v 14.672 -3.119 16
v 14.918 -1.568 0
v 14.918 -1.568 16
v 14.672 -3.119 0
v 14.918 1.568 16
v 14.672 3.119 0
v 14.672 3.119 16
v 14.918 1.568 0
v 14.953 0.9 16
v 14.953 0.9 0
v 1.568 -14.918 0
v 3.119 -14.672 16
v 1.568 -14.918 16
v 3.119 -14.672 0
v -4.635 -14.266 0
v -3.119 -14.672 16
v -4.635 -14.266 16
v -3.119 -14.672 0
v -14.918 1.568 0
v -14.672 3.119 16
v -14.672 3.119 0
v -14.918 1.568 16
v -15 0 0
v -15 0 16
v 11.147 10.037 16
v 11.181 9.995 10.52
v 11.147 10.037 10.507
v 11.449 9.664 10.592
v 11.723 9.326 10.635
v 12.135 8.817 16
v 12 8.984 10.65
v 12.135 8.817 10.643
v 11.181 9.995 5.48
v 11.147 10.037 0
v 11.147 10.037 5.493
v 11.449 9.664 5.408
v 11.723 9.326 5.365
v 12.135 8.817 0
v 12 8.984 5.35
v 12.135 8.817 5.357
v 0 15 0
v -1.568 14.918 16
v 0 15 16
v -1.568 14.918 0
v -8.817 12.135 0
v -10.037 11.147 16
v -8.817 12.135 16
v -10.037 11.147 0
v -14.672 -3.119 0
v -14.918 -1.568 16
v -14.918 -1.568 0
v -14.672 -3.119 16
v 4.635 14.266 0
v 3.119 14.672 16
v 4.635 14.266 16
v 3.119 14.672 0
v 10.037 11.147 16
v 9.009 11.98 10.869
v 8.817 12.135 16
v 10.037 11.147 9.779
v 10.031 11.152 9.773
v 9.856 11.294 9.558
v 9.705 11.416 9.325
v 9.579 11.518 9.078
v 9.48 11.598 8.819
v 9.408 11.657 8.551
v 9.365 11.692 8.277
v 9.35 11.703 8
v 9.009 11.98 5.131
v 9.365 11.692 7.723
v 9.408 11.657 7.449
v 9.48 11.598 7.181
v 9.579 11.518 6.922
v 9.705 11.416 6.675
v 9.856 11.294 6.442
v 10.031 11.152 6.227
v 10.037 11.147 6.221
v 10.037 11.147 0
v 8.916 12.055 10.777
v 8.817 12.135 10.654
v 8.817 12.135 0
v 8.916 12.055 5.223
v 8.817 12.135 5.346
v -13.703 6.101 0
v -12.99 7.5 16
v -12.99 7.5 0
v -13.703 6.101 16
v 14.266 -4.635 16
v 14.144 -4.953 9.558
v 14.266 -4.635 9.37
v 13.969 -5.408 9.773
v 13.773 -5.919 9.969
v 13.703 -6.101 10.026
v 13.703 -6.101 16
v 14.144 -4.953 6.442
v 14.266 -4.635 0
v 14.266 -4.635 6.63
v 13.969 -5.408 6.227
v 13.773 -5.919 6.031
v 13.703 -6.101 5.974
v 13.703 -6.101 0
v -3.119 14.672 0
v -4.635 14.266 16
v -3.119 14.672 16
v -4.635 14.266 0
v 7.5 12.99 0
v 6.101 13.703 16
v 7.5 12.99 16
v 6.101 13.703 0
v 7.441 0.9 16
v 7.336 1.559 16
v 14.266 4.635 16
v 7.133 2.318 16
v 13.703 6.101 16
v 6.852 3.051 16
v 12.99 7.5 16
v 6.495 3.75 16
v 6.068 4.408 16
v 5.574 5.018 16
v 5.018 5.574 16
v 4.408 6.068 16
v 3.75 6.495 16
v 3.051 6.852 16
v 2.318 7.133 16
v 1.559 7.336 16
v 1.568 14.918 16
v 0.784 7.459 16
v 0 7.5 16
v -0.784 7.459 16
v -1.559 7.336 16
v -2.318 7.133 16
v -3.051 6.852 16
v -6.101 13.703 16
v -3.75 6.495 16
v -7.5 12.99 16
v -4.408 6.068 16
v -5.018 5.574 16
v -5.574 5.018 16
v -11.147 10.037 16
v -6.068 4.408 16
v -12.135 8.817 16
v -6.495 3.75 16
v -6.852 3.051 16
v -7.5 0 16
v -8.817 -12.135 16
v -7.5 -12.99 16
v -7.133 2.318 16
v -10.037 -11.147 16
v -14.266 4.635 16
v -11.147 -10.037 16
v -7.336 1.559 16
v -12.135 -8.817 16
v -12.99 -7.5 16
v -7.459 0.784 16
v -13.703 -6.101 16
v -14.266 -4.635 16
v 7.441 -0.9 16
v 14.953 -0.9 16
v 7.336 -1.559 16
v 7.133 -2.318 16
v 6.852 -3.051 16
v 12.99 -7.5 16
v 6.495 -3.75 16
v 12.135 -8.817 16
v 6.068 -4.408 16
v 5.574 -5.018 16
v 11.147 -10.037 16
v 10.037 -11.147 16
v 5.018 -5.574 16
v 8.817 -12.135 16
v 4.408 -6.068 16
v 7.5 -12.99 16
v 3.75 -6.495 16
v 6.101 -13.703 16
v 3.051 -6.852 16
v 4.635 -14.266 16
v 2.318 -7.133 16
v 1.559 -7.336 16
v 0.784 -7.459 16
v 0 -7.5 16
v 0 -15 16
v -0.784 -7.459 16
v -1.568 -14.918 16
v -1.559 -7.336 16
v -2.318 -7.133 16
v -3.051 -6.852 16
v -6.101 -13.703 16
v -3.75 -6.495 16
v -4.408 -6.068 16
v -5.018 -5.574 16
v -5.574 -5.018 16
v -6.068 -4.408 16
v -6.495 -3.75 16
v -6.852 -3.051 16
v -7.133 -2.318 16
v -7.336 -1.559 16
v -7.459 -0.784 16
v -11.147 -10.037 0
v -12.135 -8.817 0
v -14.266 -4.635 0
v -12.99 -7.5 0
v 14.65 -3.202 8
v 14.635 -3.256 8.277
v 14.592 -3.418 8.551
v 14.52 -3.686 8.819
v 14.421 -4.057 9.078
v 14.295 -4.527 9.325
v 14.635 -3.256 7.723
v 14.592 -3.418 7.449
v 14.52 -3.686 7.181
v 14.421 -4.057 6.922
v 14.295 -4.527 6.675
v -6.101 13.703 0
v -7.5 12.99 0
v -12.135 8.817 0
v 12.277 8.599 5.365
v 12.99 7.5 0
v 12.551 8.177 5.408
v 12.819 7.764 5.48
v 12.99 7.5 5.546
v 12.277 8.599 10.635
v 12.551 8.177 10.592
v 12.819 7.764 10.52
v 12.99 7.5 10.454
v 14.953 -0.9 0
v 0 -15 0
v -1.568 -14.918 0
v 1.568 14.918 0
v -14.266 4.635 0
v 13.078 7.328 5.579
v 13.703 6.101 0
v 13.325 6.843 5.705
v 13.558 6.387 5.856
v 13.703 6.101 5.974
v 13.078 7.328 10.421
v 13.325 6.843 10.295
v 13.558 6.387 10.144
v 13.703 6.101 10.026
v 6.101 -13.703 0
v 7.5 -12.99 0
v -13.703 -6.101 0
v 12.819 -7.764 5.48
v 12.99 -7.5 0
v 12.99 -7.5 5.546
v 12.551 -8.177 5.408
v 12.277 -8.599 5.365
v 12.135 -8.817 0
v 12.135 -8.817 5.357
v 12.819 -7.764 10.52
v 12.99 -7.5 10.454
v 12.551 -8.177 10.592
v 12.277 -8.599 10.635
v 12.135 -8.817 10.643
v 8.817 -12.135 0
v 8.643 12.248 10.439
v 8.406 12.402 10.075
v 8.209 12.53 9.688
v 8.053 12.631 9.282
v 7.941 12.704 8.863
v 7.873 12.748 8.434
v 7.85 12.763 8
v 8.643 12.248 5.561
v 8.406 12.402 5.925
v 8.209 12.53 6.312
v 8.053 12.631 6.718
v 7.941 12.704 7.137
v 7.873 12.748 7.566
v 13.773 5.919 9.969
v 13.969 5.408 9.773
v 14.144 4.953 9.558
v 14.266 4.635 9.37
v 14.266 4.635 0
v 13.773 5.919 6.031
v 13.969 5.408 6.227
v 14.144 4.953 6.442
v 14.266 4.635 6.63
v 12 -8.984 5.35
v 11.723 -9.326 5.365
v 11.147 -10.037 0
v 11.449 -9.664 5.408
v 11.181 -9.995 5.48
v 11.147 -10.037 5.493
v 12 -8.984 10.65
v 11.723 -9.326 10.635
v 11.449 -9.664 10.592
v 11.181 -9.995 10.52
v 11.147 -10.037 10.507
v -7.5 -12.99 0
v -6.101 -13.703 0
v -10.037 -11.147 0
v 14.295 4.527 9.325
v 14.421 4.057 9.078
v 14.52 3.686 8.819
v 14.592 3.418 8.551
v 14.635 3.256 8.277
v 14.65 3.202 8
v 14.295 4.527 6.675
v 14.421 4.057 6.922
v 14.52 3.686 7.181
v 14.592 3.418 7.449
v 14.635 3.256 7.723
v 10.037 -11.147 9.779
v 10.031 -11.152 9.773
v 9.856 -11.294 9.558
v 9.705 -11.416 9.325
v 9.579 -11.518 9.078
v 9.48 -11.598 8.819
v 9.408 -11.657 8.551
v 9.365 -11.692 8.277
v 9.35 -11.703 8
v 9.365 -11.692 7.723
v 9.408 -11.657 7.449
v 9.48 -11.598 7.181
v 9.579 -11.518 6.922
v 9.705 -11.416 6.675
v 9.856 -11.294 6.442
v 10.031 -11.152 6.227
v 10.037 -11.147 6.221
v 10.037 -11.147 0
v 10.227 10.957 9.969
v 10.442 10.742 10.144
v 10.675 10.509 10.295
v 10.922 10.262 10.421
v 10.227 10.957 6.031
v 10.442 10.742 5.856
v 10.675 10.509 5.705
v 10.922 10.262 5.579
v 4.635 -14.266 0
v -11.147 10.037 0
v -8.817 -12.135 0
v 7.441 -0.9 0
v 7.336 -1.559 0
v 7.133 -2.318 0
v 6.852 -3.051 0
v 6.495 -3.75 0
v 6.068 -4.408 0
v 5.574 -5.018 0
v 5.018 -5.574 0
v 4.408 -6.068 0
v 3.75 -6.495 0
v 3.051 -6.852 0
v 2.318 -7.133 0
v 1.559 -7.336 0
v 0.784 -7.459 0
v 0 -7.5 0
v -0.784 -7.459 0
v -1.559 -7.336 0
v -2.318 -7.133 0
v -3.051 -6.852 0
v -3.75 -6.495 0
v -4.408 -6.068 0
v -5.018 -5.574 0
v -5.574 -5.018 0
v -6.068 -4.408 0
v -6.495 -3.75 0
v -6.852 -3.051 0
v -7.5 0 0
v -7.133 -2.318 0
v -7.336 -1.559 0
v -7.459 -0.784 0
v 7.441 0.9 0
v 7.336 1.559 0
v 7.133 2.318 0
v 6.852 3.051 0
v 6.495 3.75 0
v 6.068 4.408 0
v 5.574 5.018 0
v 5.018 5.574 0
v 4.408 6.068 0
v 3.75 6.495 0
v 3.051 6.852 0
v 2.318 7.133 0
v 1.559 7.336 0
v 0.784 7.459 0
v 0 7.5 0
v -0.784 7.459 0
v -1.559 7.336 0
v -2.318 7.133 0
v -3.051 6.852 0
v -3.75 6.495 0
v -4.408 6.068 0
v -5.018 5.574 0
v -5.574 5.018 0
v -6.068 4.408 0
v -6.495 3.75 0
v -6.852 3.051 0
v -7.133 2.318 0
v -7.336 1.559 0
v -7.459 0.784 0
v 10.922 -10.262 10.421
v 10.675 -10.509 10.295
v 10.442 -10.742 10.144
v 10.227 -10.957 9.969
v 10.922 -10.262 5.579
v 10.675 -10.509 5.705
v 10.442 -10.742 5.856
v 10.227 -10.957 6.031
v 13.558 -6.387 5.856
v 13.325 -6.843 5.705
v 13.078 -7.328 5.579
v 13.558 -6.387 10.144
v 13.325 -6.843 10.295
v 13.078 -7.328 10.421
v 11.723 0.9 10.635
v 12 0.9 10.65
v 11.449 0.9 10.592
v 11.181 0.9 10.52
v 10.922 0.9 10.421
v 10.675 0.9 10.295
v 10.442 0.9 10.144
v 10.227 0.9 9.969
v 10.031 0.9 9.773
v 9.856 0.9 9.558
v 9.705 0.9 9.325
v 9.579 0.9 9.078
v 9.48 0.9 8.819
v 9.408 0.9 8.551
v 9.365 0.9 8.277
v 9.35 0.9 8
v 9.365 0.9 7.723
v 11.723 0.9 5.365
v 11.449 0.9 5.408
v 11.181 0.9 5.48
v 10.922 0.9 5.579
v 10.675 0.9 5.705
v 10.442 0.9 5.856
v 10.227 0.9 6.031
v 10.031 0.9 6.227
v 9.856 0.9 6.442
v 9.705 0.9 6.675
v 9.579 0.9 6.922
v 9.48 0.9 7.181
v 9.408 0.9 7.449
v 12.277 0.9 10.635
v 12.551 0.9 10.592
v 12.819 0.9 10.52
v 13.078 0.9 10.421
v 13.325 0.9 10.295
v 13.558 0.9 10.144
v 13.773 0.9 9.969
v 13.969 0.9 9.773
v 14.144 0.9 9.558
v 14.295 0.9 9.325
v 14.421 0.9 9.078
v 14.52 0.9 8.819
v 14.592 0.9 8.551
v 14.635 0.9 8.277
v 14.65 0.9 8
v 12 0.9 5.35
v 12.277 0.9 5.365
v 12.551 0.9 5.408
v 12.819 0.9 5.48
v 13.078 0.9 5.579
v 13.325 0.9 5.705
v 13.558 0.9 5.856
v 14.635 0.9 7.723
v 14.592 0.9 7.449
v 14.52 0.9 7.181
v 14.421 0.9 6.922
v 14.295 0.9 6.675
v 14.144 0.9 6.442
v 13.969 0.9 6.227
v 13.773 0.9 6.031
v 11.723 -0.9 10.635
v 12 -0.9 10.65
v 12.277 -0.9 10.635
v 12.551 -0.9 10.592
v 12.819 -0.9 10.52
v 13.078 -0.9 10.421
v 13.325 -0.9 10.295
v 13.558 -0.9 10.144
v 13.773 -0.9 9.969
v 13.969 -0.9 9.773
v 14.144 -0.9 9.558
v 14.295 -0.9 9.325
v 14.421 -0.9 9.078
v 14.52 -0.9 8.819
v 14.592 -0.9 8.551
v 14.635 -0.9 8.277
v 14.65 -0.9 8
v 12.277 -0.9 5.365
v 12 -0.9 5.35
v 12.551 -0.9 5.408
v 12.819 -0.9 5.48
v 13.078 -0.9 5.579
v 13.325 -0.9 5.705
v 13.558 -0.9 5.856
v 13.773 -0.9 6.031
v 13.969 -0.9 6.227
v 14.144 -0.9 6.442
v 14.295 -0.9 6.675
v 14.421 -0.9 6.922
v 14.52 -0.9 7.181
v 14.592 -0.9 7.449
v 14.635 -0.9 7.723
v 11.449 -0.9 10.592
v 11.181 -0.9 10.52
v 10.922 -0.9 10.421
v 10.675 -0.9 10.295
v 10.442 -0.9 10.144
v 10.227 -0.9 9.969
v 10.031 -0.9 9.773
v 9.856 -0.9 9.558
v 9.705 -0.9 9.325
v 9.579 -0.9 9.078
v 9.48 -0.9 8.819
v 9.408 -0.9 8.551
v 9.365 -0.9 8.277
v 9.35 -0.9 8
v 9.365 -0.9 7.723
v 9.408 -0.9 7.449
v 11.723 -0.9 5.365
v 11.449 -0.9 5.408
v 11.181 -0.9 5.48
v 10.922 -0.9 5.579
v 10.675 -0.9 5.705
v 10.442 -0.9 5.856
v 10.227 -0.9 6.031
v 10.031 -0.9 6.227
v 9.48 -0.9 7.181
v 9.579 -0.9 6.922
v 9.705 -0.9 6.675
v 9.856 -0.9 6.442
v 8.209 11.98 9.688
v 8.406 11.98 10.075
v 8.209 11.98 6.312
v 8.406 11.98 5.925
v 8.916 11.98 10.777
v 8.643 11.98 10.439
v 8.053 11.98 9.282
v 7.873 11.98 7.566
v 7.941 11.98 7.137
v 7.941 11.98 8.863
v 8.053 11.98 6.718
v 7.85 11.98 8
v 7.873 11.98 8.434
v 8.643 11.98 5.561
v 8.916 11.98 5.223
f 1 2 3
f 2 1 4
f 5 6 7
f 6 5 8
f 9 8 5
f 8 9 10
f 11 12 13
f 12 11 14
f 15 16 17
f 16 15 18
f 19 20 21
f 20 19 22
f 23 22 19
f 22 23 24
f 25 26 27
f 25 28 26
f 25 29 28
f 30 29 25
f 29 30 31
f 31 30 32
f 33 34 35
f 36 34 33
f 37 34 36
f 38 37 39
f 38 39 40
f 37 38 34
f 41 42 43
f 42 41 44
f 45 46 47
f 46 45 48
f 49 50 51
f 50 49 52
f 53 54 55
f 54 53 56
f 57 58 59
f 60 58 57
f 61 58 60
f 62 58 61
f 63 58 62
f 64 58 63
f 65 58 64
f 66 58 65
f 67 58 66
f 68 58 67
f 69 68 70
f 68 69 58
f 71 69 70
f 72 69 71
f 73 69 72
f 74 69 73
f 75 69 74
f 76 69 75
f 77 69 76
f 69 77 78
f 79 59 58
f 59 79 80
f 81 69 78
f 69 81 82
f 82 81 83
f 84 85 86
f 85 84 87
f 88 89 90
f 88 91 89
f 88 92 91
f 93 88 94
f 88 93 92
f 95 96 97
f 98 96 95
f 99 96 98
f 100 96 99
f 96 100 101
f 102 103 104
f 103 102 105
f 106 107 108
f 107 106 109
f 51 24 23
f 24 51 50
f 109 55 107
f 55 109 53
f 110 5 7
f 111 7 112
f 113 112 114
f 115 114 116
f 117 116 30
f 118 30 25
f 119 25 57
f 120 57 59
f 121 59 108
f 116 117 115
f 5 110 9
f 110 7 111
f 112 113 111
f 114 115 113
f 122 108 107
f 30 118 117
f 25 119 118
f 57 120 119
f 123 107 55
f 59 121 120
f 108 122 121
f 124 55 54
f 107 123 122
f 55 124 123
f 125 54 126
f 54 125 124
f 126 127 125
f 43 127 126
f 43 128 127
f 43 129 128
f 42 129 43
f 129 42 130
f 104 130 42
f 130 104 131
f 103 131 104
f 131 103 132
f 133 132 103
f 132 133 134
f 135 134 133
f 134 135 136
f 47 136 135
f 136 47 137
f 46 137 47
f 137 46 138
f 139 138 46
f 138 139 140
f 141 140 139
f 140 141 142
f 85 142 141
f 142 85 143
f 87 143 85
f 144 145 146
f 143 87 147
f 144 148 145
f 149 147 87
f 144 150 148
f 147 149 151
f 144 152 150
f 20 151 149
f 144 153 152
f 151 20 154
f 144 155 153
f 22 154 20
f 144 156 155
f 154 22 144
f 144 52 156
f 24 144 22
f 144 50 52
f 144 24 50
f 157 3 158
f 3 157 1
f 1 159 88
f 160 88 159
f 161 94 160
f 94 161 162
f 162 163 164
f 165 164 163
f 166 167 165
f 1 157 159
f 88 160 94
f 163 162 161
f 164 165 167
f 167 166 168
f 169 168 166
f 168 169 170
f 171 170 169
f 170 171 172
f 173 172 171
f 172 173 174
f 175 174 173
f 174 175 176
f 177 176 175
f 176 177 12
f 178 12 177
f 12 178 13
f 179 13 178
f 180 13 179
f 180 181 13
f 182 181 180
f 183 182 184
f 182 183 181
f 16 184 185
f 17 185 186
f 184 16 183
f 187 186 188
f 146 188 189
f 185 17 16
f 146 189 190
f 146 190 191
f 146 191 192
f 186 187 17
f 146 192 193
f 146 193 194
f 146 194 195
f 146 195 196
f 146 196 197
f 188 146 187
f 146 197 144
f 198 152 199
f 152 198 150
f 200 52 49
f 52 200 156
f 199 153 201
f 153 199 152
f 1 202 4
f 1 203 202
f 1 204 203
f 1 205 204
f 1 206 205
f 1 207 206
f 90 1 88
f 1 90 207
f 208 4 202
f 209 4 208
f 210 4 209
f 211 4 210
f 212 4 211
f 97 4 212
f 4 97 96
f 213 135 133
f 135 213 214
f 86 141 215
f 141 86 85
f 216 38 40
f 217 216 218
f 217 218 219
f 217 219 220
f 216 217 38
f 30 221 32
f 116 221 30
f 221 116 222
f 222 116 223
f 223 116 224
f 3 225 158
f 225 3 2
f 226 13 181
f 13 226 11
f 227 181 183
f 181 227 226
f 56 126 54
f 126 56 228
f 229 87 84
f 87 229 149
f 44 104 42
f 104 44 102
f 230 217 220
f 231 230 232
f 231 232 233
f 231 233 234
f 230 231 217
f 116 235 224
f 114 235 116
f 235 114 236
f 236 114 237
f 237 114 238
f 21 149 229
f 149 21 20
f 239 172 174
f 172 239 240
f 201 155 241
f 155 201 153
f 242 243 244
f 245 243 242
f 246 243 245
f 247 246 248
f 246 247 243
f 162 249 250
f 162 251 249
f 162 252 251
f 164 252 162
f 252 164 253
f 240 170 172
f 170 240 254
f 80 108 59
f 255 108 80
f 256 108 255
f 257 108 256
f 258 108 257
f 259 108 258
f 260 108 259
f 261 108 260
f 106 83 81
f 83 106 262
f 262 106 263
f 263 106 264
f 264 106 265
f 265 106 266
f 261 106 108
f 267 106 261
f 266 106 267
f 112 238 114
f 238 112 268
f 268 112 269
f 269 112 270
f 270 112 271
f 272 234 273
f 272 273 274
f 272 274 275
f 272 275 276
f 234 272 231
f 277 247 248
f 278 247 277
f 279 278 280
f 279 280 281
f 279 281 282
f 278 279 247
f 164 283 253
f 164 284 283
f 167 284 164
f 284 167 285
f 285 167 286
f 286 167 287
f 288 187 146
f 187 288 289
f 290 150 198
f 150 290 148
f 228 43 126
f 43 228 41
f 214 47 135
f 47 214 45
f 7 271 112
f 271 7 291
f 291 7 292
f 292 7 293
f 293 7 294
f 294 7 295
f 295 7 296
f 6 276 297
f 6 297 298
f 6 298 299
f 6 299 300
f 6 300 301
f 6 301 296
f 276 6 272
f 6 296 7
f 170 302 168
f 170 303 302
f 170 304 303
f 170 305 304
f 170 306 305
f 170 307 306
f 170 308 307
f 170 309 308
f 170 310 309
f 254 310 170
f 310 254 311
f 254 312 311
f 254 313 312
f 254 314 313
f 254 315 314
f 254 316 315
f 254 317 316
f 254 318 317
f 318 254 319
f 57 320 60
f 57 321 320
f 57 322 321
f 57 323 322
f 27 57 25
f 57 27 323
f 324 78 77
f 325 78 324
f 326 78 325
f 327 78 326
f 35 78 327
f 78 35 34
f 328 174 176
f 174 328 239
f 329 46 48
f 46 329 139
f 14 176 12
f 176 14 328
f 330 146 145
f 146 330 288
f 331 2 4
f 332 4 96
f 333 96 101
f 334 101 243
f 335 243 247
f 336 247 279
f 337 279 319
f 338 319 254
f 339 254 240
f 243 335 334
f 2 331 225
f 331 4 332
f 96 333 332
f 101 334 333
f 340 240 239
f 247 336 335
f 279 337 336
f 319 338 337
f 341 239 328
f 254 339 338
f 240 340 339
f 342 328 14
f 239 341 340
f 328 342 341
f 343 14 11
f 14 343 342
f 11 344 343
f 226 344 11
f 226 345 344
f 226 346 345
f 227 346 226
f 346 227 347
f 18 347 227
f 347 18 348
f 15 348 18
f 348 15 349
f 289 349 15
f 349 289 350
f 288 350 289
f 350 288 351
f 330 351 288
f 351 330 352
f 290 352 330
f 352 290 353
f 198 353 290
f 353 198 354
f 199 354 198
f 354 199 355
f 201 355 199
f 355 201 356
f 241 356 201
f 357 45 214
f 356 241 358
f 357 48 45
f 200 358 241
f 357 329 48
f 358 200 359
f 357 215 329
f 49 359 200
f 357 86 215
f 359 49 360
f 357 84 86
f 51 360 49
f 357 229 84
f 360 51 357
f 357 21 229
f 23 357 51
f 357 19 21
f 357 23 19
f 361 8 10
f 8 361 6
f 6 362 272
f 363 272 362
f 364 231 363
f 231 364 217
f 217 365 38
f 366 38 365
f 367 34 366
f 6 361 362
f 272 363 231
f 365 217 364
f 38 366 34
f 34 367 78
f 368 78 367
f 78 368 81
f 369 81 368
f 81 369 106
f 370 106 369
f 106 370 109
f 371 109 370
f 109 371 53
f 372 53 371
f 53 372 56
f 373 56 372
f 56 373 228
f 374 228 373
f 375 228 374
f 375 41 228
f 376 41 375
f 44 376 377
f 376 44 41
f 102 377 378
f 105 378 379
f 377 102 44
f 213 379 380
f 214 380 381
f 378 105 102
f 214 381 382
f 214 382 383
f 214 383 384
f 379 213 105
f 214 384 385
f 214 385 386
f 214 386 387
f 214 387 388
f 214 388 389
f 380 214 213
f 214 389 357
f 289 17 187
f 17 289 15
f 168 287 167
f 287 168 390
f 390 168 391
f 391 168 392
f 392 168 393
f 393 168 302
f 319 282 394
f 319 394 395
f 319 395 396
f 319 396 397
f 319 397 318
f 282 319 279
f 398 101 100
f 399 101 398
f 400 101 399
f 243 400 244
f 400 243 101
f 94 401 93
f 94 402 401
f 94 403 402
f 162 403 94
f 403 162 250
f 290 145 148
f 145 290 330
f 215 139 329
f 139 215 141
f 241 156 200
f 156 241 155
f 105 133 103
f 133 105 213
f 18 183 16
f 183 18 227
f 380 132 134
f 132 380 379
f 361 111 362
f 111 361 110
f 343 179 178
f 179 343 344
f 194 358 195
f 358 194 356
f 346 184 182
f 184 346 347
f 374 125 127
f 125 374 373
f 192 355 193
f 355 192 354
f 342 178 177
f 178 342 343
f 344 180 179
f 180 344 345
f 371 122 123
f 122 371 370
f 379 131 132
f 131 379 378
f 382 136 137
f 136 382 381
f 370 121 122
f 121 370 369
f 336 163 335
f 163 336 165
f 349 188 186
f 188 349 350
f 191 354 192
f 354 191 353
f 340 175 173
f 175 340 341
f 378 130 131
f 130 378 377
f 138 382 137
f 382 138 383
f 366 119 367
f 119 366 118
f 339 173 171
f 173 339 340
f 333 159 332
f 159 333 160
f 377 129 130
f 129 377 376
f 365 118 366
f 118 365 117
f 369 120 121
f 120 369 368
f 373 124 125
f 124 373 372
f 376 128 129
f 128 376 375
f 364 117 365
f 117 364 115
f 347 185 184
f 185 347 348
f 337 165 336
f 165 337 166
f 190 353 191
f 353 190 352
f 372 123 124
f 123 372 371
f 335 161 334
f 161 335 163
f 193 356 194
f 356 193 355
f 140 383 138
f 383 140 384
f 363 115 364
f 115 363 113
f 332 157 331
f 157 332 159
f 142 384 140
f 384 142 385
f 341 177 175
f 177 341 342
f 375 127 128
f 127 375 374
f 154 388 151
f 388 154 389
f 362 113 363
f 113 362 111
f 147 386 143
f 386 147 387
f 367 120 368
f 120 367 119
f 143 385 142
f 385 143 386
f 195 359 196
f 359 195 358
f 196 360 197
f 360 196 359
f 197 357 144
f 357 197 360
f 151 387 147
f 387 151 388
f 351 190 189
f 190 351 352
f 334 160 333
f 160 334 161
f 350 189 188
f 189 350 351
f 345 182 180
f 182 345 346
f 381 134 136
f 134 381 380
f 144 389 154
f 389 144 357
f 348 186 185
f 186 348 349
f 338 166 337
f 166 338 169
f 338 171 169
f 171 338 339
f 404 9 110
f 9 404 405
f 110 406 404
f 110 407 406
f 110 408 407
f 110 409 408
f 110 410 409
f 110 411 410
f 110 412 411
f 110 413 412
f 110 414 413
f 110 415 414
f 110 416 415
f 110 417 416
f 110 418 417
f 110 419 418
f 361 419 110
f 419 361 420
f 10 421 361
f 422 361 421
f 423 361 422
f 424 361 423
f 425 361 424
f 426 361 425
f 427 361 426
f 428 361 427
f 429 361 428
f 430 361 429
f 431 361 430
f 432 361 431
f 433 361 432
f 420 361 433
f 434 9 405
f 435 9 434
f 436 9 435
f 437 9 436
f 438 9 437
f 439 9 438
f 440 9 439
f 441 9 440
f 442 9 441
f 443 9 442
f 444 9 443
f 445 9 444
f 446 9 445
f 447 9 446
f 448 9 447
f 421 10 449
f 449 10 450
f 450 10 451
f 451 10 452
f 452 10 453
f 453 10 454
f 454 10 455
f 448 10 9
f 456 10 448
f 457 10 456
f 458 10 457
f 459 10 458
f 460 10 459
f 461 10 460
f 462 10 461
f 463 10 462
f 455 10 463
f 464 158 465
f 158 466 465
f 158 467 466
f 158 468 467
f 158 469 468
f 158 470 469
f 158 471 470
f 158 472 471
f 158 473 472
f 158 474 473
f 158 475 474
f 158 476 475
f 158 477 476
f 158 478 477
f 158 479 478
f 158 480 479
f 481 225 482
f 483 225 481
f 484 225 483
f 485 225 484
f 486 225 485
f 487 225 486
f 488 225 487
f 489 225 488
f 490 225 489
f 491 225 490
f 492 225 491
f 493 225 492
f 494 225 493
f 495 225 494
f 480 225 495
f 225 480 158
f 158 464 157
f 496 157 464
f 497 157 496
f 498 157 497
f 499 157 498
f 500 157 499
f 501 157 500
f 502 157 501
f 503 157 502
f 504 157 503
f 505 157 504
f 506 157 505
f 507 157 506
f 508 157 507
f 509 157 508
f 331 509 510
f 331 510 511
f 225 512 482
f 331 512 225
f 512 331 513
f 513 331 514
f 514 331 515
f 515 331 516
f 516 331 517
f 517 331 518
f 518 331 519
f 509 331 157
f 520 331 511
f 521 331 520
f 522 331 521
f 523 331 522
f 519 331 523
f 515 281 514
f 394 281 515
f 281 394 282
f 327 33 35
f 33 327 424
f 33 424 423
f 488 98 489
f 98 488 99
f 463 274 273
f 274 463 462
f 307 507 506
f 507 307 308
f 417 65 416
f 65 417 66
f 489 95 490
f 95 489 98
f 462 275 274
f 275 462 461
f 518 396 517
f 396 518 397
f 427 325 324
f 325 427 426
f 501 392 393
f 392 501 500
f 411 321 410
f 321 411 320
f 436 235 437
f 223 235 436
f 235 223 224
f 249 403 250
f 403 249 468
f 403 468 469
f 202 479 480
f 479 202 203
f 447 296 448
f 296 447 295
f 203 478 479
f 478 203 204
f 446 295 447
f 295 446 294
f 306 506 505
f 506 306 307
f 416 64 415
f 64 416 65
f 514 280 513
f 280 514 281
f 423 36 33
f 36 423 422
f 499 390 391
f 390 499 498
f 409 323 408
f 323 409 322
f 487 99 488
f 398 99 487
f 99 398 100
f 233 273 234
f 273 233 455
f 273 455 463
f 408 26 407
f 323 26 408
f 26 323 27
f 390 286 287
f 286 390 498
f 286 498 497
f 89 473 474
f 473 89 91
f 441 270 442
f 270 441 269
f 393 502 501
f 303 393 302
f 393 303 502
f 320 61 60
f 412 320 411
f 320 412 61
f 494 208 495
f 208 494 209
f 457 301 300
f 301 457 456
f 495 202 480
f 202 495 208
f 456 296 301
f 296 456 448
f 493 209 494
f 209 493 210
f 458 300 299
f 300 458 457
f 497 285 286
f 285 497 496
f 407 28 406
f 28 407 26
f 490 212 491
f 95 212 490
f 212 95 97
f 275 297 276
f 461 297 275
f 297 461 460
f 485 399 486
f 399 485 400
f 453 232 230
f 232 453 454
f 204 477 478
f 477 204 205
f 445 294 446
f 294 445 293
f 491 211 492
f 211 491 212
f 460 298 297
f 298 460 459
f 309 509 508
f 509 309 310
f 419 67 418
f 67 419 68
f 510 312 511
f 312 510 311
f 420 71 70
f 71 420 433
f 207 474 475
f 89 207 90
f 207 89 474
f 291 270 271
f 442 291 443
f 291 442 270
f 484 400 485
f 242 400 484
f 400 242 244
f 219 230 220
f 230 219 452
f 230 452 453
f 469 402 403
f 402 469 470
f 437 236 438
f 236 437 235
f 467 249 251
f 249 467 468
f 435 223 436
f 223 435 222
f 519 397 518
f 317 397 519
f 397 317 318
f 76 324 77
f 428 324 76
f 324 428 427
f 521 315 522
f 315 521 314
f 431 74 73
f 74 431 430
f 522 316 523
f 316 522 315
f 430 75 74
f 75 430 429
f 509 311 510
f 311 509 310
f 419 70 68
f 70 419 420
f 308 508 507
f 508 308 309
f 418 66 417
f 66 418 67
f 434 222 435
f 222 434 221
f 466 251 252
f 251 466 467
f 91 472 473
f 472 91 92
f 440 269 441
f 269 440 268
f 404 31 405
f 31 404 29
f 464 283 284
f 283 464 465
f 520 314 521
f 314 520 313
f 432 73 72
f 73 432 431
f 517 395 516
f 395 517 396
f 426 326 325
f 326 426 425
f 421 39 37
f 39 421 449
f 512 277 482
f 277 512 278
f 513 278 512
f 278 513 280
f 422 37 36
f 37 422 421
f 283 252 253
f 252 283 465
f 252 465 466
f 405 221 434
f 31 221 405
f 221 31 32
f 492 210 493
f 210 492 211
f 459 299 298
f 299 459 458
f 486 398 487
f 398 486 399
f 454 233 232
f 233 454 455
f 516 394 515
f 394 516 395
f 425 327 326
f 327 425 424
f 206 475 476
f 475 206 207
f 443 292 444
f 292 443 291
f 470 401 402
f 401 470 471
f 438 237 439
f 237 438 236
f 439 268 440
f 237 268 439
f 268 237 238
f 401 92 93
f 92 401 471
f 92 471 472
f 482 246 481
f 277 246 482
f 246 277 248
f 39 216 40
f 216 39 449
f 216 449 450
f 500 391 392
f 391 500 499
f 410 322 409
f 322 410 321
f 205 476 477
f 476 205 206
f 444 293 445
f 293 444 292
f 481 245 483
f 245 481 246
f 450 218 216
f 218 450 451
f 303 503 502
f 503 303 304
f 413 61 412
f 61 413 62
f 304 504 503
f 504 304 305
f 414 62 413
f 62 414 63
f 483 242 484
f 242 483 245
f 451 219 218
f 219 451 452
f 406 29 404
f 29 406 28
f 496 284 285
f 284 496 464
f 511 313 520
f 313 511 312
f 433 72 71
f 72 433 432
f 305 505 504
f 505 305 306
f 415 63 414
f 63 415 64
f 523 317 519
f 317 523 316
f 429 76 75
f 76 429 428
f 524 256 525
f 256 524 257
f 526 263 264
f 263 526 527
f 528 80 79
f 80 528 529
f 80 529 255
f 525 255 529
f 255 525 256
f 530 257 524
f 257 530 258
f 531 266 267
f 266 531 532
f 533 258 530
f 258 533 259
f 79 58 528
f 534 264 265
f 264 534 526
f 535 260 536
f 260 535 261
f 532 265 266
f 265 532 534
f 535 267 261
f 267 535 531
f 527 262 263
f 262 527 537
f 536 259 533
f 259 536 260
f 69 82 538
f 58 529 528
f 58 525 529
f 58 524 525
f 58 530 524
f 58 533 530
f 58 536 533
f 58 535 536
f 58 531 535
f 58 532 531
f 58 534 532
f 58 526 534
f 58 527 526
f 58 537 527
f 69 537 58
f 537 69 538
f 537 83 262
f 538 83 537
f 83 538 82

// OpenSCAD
// C-style split collar for 15 mm shaft.
$fn = 60;
eps = 0.02;
shaft_d = 15;
outer_d = 30;
width = 16;
slit_w = 1.8;
screw_d = 5.3;
difference() {
    cylinder(d = outer_d, h = width);
    translate([0, 0, -eps]) cylinder(d = shaft_d, h = width + 2 * eps);
    translate([0, -slit_w / 2, -eps]) cube([outer_d / 2 + eps, slit_w, width + 2 * eps]);
    translate([outer_d / 2 - 3, -outer_d / 2 - eps, width / 2]) rotate([-90, 0, 0]) cylinder(d = screw_d, h = outer_d + 2 * eps);
    translate([outer_d / 2 - 3, outer_d / 2 - 3 - eps, width / 2]) rotate([-90, 0, 0]) cylinder(d = screw_d + 3, h = 3 + 2 * eps);
}
